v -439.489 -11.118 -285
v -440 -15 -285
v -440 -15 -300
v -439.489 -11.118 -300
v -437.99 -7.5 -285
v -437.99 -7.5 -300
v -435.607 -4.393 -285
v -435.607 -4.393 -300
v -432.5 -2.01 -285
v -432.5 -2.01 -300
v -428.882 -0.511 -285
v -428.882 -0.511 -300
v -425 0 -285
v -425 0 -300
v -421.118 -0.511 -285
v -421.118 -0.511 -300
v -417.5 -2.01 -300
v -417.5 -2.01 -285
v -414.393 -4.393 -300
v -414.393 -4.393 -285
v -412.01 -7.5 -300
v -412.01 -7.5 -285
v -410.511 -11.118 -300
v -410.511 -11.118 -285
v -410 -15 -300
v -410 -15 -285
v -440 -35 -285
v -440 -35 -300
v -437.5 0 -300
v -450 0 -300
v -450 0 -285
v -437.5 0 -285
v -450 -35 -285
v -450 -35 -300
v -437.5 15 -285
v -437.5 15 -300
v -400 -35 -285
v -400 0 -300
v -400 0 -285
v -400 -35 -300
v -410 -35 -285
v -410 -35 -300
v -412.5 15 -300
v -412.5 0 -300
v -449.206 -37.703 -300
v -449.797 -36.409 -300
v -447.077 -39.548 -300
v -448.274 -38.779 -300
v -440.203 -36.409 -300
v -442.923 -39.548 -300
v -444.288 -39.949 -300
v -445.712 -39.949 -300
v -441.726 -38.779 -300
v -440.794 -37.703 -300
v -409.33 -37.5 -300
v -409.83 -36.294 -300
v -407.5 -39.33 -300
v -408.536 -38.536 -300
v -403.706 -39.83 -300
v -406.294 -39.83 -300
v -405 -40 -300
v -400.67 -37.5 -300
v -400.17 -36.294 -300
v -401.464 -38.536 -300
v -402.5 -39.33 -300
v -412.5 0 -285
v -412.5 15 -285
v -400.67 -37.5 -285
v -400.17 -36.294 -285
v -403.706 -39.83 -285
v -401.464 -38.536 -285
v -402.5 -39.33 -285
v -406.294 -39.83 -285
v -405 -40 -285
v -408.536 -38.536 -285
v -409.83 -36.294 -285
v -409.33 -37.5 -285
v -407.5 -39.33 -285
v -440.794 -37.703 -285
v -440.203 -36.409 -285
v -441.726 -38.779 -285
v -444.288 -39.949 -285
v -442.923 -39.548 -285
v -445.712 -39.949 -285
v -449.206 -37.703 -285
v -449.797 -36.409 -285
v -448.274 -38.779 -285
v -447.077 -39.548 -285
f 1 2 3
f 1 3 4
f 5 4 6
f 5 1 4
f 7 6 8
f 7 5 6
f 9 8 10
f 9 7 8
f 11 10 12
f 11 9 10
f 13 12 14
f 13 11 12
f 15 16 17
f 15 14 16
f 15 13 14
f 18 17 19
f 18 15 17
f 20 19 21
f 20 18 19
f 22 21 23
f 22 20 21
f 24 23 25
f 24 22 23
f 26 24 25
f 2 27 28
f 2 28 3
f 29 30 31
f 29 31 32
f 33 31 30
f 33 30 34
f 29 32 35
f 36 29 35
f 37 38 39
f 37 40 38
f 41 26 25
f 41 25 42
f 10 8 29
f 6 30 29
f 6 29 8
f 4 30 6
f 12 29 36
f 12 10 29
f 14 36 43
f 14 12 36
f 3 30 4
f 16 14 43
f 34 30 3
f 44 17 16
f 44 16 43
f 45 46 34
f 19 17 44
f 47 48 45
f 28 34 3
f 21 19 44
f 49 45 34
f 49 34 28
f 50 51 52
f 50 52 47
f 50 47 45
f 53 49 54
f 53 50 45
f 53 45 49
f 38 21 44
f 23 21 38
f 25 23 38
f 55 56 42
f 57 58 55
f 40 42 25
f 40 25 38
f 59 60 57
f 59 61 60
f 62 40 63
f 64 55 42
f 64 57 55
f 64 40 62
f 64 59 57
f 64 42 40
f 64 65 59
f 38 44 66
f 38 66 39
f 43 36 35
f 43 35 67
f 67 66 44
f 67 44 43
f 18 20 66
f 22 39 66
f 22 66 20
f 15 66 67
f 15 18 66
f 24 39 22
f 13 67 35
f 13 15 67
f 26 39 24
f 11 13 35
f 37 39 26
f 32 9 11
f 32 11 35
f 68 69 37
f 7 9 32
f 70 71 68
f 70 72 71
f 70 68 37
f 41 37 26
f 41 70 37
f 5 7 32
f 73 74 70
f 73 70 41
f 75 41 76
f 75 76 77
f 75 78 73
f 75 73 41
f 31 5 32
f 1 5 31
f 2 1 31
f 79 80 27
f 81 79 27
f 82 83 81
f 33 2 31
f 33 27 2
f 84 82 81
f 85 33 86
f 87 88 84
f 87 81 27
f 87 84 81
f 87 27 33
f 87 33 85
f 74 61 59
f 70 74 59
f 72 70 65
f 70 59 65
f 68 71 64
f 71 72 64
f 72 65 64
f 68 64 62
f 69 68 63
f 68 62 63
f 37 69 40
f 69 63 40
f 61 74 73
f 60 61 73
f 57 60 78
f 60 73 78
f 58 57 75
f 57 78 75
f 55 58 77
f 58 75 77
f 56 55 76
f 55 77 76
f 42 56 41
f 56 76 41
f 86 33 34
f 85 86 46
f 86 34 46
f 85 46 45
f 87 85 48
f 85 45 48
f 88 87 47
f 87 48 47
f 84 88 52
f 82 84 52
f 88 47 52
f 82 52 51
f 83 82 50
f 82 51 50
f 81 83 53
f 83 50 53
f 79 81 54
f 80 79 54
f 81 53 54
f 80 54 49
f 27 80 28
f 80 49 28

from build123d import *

# Parameters (mm, degrees)
BOSS_EXTRUDE1_DEPTH             = 15
BOSS_EXTRUDE2_REACH             = 1239.023
BOSS_EXTRUDE2_DIRECTION_2_REACH = 1239.023
CUT_EXTRUDE2_DEPTH              = 1238.578280352
CUT_EXTRUDE2_DEPTH_BACK         = 1238.578280352
SKETCH5_W                       = 40
SKETCH5_H                       = 40
CUT_EXTRUDE3_DEPTH              = 1238.578280352
BOSS_EXTRUDE4_DEPTH             = 75
CUT_EXTRUDE4_DEPTH              = 1241.107934819
CUT_EXTRUDE4_DEPTH_BACK         = 1241.107934819
SKETCH8_W                       = 15
SKETCH8_H                       = 73.7
FILLET1_R                       = 5
CUT_EXTRUDE5_DEPTH              = 1241.107934819
CUT_EXTRUDE5_DEPTH_BACK         = 1241.107934819
SKETCH10_W                      = 12.5
SKETCH10_H                      = 15
CUT_EXTRUDE6_DEPTH              = 453.023229492


with BuildPart() as part:
    # Sketch1 → Boss-Extrude1 (new body)
    with BuildSketch(Plane(origin=(0, 0, 0), x_dir=(1, 0, 0), z_dir=(0, 1, 0))):
        Polygon((-450, 300), (-400, 300), (-200, 250), (600, 40), (1200, 40), (1200, -40), (600, -40), (-200, -250), (-400, -300), (-450, -300), align=None)
    extrude(amount=BOSS_EXTRUDE1_DEPTH)

    # Boss-Extrude2: up to this face of the body (flat: up to its plane)
    boss_extrude2_end = Plane(part.part.faces().sort_by_distance((-425, 7.5, 300))[0])
    # Sketch2 → Boss-Extrude2 (add, up to the picked face)
    with BuildSketch(Plane.XY, mode=Mode.PRIVATE) as boss_extrude2_sk1:
        with BuildLine():
            Line((-425, 0), (-450, 0))
            Line((-450, 0), (-450, -40))
            Line((-450, -40), (-440, -40))
            Line((-440, -40), (-440, -15))
            ThreePointArc((-440, -15), (-435.606601718, -4.393398282), (-425, 0))
        make_face()
    boss_extrude2_tool1 = split(extrude(boss_extrude2_sk1.sketch, amount=BOSS_EXTRUDE2_REACH, mode=Mode.PRIVATE), bisect_by=boss_extrude2_end, keep=Keep.BOTH, mode=Mode.PRIVATE)
    # Sketch2 → Boss-Extrude2 (add, up to the picked face)
    with BuildSketch(Plane.XY, mode=Mode.PRIVATE) as boss_extrude2_sk2:
        with BuildLine():
            Line((-400, 0), (-425, 0))
            ThreePointArc((-425, 0), (-414.393398282, -4.393398282), (-410, -15))
            Line((-410, -15), (-410, -40))
            Line((-410, -40), (-400, -40))
            Line((-400, -40), (-400, 0))
        make_face()
    boss_extrude2_tool2 = split(extrude(boss_extrude2_sk2.sketch, amount=BOSS_EXTRUDE2_REACH, mode=Mode.PRIVATE), bisect_by=boss_extrude2_end, keep=Keep.BOTH, mode=Mode.PRIVATE)
    add(boss_extrude2_tool1.solids().sort_by(Axis((-444.100555, -18.206662, 0), (0, 0, 1)))[0])
    add(boss_extrude2_tool2.solids().sort_by(Axis((-405.899445, -18.206662, 0), (0, 0, 1)))[0])

    # Boss-Extrude2 direction 2: up to this face of the body (flat: up to its plane)
    boss_extrude2_direction_2_end = Plane(part.part.faces().sort_by_distance((-425, 7.5, -300))[0])
    # Sketch2 → Boss-Extrude2 direction 2 (add, up to the picked face)
    with BuildSketch(Plane.XY, mode=Mode.PRIVATE) as boss_extrude2_direction_2_sk1:
        with BuildLine():
            Line((-425, 0), (-450, 0))
            Line((-450, 0), (-450, -40))
            Line((-450, -40), (-440, -40))
            Line((-440, -40), (-440, -15))
            ThreePointArc((-440, -15), (-435.606601718, -4.393398282), (-425, 0))
        make_face()
    boss_extrude2_direction_2_tool1 = split(extrude(boss_extrude2_direction_2_sk1.sketch, amount=-BOSS_EXTRUDE2_DIRECTION_2_REACH, mode=Mode.PRIVATE), bisect_by=boss_extrude2_direction_2_end, keep=Keep.BOTH, mode=Mode.PRIVATE)
    # Sketch2 → Boss-Extrude2 direction 2 (add, up to the picked face)
    with BuildSketch(Plane.XY, mode=Mode.PRIVATE) as boss_extrude2_direction_2_sk2:
        with BuildLine():
            Line((-400, 0), (-425, 0))
            ThreePointArc((-425, 0), (-414.393398282, -4.393398282), (-410, -15))
            Line((-410, -15), (-410, -40))
            Line((-410, -40), (-400, -40))
            Line((-400, -40), (-400, 0))
        make_face()
    boss_extrude2_direction_2_tool2 = split(extrude(boss_extrude2_direction_2_sk2.sketch, amount=-BOSS_EXTRUDE2_DIRECTION_2_REACH, mode=Mode.PRIVATE), bisect_by=boss_extrude2_direction_2_end, keep=Keep.BOTH, mode=Mode.PRIVATE)
    add(boss_extrude2_direction_2_tool1.solids().sort_by(Axis((-444.100555, -18.206662, 0), (0, 0, -1)))[0])
    add(boss_extrude2_direction_2_tool2.solids().sort_by(Axis((-405.899445, -18.206662, 0), (0, 0, -1)))[0])

    # Sketch4 → Cut-Extrude2 (cut, two sides: drawn at the far end of the back side and taken through both)
    with BuildSketch(Plane(origin=(0, 0, 0), x_dir=(1, 0, 0), z_dir=(0, 1, 0)).offset(-CUT_EXTRUDE2_DEPTH_BACK)):
        Polygon((-450, 230), (-400, 230), (-150, 167.5), (-150, -167.5), (-400, -230), (-450, -230), align=None)
        Polygon((-100, 155), (-100, -155), (520, 0), align=None)
    extrude(amount=CUT_EXTRUDE2_DEPTH + CUT_EXTRUDE2_DEPTH_BACK, mode=Mode.SUBTRACT)

    # Sketch5 → Cut-Extrude3 (cut, through all)
    with BuildSketch(Plane(origin=(0, 0, 0), x_dir=(0, 0, -1), z_dir=(1, 0, 0))):
        with Locations((-265, -20)):
            Rectangle(SKETCH5_W, SKETCH5_H)
        with Locations((265, -20)):
            Rectangle(SKETCH5_W, SKETCH5_H)
    extrude(amount=-CUT_EXTRUDE3_DEPTH, mode=Mode.SUBTRACT)

    # Sketch7 → Boss-Extrude4 (add)
    with BuildSketch(Plane(origin=(1200, 0, 0), x_dir=(0, 0, -1), z_dir=(1, 0, 0))):
        with BuildLine():
            Line((-87.5, 50), (-40, 15))
            Line((-40, 15), (40, 15))
            Line((40, 15), (87.5, 50))
            Line((87.5, 50), (87.5, 88.7))
            Line((87.5, 88.7), (58.5, 88.7))
            Line((58.5, 88.7), (58.5, 63.2))
            Line((58.5, 63.2), (48.5, 63.2))
            Line((48.5, 63.2), (48.5, 88.7))
            Line((48.5, 88.7), (20, 88.7))
            Line((20, 88.7), (20, 50))
            ThreePointArc((20, 50), (0, 30), (-20, 50))
            Line((-20, 50), (-20, 88.7))
            Line((-20, 88.7), (-63, 88.7))
            Line((-63, 88.7), (-63, 63.2))
            Line((-63, 63.2), (-73, 63.2))
            Line((-73, 63.2), (-73, 88.7))
            Line((-73, 88.7), (-87.5, 88.7))
            Line((-87.5, 88.7), (-87.5, 50))
        make_face()
    extrude(amount=-BOSS_EXTRUDE4_DEPTH)

    # Sketch8 → Cut-Extrude4 (cut, two sides: drawn at the far end of the back side and taken through both)
    with BuildSketch(Plane.XY.offset(-CUT_EXTRUDE4_DEPTH_BACK)):
        with Locations((1147.5, 51.85)):
            Rectangle(SKETCH8_W, SKETCH8_H)
        with Locations((1177.5, 51.85)):
            Rectangle(SKETCH8_W, SKETCH8_H)
    extrude(amount=CUT_EXTRUDE4_DEPTH + CUT_EXTRUDE4_DEPTH_BACK, mode=Mode.SUBTRACT)

    # Fillet1
    # the kernel refuses this fillet: 5 mm, written as the material it adds along each edge
    with BuildSketch(Plane(origin=(600, 0, -40), x_dir=(1, 0, 0), z_dir=(0, 1, 0)), Plane(origin=(600, 0, 40), x_dir=(-0.9672309653794254, 0, 0.25389812841213444), z_dir=(0, 1, 0))) as fillet1_piece_1:
        with BuildLine():
            CenterArc((FILLET1_R * 0.12906371081, FILLET1_R), FILLET1_R, 255.2916961, 14.7083039)
            Line((-FILLET1_R * 0.124834417602, FILLET1_R * 0.0327690346206), (0, 0))
            Line((0, 0), (FILLET1_R * 0.12906371081, 0))
        make_face()
    extrude(amount=15)
    with BuildSketch(Plane(origin=(-150, 15, -167.5), x_dir=(-0.9701425001453314, 0, -0.2425356250363347), z_dir=(0, -1, 0)), Plane(origin=(-150, 15, 167.5), x_dir=(0, 0, -1), z_dir=(0, -1, 0))) as fillet1_piece_2:
        with BuildLine():
            CenterArc((FILLET1_R * 0.780776406404, -FILLET1_R), FILLET1_R, 90, 75.963756532)
            Line((-FILLET1_R * 0.189366093741, -FILLET1_R * 0.757464374964), (0, 0))
            Line((0, 0), (FILLET1_R * 0.780776406404, 0))
        make_face()
    extrude(amount=15)
    with BuildSketch(Plane(origin=(-100, 15, -155), x_dir=(0.9701425001453314, 0, 0.24253562503633508), z_dir=(0, -1, 0)), Plane(origin=(-100, 0, 155), x_dir=(0.9701425001453319, 0, -0.24253562503633352), z_dir=(0, 1, 0))) as fillet1_piece_3:
        with BuildLine():
            CenterArc((FILLET1_R * 1.2807764064, FILLET1_R), FILLET1_R, 165.963756532, 104.036243468)
            Line((FILLET1_R * 0.310633906259, FILLET1_R * 1.24253562504), (0, 0))
            Line((0, 0), (FILLET1_R * 1.2807764064, 0))
        make_face()
    extrude(amount=15)
    with BuildSketch(Plane(origin=(520, 15, 0), x_dir=(-0.9701425001453318, 0, -0.24253562503633325), z_dir=(0, -1, 0))) as fillet1_piece_4:
        with BuildLine():
            CenterArc((FILLET1_R * 4, -FILLET1_R), FILLET1_R, 90, 151.927513064)
            Line((FILLET1_R * 3.52941176471, -FILLET1_R * 1.88235294118), (0, 0))
            Line((0, 0), (FILLET1_R * 4, 0))
        make_face()
    extrude(amount=15)
    # the kernel refuses this fillet: 5 mm, written as the material it takes off along each edge
    with BuildSketch(Plane(origin=(-440, -40, 217.5), x_dir=(0, 1, 0), z_dir=(0, 0, 1)), Plane(origin=(-400, -40, 217.5), x_dir=(0, 1, 0), z_dir=(0, 0, 1)), Plane(origin=(-440, -40, -312.5), x_dir=(0, 1, 0), z_dir=(0, 0, 1)), Plane(origin=(-450, -40, -312.5), x_dir=(1, 0, 0), z_dir=(0, 0, 1)), Plane(origin=(-400, -40, -312.5), x_dir=(0, 1, 0), z_dir=(0, 0, 1)), Plane(origin=(1152.5, 88.7, -20), x_dir=(0, 0, -1), z_dir=(-1, 0, 0)), Plane(origin=(1152.5, 88.7, -48.5), x_dir=(0, -1, 0), z_dir=(-1, 0, 0)), Plane(origin=(1152.5, 88.7, -58.5), x_dir=(0, 0, -1), z_dir=(-1, 0, 0)), Plane(origin=(1152.5, 88.7, -87.5), x_dir=(0, -1, 0), z_dir=(-1, 0, 0)), Plane(origin=(1152.5, 88.7, 87.5), x_dir=(0, 0, -1), z_dir=(-1, 0, 0)), Plane(origin=(1152.5, 88.7, 73), x_dir=(0, -1, 0), z_dir=(-1, 0, 0)), Plane(origin=(1152.5, 88.7, 63), x_dir=(0, 0, -1), z_dir=(-1, 0, 0)), Plane(origin=(1152.5, 88.7, 20), x_dir=(0, -1, 0), z_dir=(-1, 0, 0)), Plane(origin=(1182.5, 88.7, 20), x_dir=(0, -1, 0), z_dir=(-1, 0, 0)), Plane(origin=(1212.5, 88.7, 20), x_dir=(0, -1, 0), z_dir=(-1, 0, 0)), Plane(origin=(1182.5, 88.7, 63), x_dir=(0, 0, -1), z_dir=(-1, 0, 0)), Plane(origin=(1212.5, 88.7, 63), x_dir=(0, 0, -1), z_dir=(-1, 0, 0)), Plane(origin=(1182.5, 88.7, 73), x_dir=(0, -1, 0), z_dir=(-1, 0, 0)), Plane(origin=(1212.5, 88.7, 73), x_dir=(0, -1, 0), z_dir=(-1, 0, 0)), Plane(origin=(1182.5, 88.7, -87.5), x_dir=(0, -1, 0), z_dir=(-1, 0, 0)), Plane(origin=(1212.5, 88.7, -87.5), x_dir=(0, -1, 0), z_dir=(-1, 0, 0)), Plane(origin=(1182.5, 88.7, -58.5), x_dir=(0, 0, -1), z_dir=(-1, 0, 0)), Plane(origin=(1212.5, 88.7, -58.5), x_dir=(0, 0, -1), z_dir=(-1, 0, 0)), Plane(origin=(1182.5, 88.7, -48.5), x_dir=(0, -1, 0), z_dir=(-1, 0, 0)), Plane(origin=(1212.5, 88.7, -48.5), x_dir=(0, -1, 0), z_dir=(-1, 0, 0)), Plane(origin=(1182.5, 88.7, -20), x_dir=(0, 0, -1), z_dir=(-1, 0, 0)), Plane(origin=(1212.5, 88.7, -20), x_dir=(0, 0, -1), z_dir=(-1, 0, 0)), Plane(origin=(-410, -40, 312.5), x_dir=(0, 1, 0), z_dir=(0, 0, -1)), Plane(origin=(-410, -40, -217.5), x_dir=(0, 1, 0), z_dir=(0, 0, -1))) as fillet1_2_piece_1:
        with BuildLine():
            CenterArc((FILLET1_R, FILLET1_R), FILLET1_R, 180, 90)
            Line((0, FILLET1_R), (0, 0))
            Line((0, 0), (FILLET1_R, 0))
        make_face()
    extrude(amount=40, mode=Mode.SUBTRACT)
    with BuildSketch(Plane(origin=(-450, -40, 217.5), x_dir=(0, 1, 0), z_dir=(0, 0, 1)), Plane(origin=(-410, -40, 257.5), x_dir=(1, 0, 0), z_dir=(0, 0, -1)), Plane(origin=(-410, -40, -272.5), x_dir=(1, 0, 0), z_dir=(0, 0, -1)), Plane(origin=(1182.5, 88.7, 87.5), x_dir=(0, -1, 0), z_dir=(-1, 0, 0)), Plane(origin=(1212.5, 88.7, 87.5), x_dir=(0, -1, 0), z_dir=(-1, 0, 0)), Plane(origin=(-400, -40, 272.5), x_dir=(-1, 0, 0), z_dir=(0, 0, 1)), Plane(origin=(-450, -40, 272.5), x_dir=(0, 1, 0), z_dir=(0, 0, 1)), Plane(origin=(-440, -40, 272.5), x_dir=(-1, 0, 0), z_dir=(0, 0, 1)), Plane(origin=(-440, -40, -257.5), x_dir=(-1, 0, 0), z_dir=(0, 0, 1)), Plane(origin=(-450, -40, -257.5), x_dir=(0, 1, 0), z_dir=(0, 0, 1)), Plane(origin=(-400, -40, -257.5), x_dir=(-1, 0, 0), z_dir=(0, 0, 1))) as fillet1_2_piece_2:
        with BuildLine():
            CenterArc((FILLET1_R, -FILLET1_R), FILLET1_R, 90, 90)
            Line((0, -FILLET1_R), (0, 0))
            Line((0, 0), (FILLET1_R, 0))
        make_face()
    extrude(amount=40, mode=Mode.SUBTRACT)
    with BuildSketch(Plane(origin=(1146.316347002, 50, -87.5), x_dir=(0, -0.5931990380498489, 0.8050558373533688), z_dir=(-1, 0, 0)), Plane(origin=(1176.316347002, 50, -87.5), x_dir=(0, -0.5931990380498489, 0.8050558373533688), z_dir=(-1, 0, 0)), Plane(origin=(1206.316347002, 50, -87.5), x_dir=(0, -0.5931990380498489, 0.8050558373533688), z_dir=(-1, 0, 0))) as fillet1_2_piece_3:
        with BuildLine():
            CenterArc((FILLET1_R * 0.505307760127, FILLET1_R), FILLET1_R, 216.384351816, 53.615648184)
            Line((-FILLET1_R * 0.299748077226, FILLET1_R * 0.40680096195), (0, 0))
            Line((0, 0), (FILLET1_R * 0.505307760127, 0))
        make_face()
    extrude(amount=27.632694003, mode=Mode.SUBTRACT)
    with BuildSketch(Plane(origin=(1146.316347002, 50, 87.5), x_dir=(0, -0.5931990380498499, -0.8050558373533683), z_dir=(-1, 0, 0)), Plane(origin=(1176.316347002, 50, 87.5), x_dir=(0, -0.5931990380498499, -0.8050558373533683), z_dir=(-1, 0, 0)), Plane(origin=(1206.316347002, 50, 87.5), x_dir=(0, -0.5931990380498499, -0.8050558373533683), z_dir=(-1, 0, 0))) as fillet1_2_piece_4:
        with BuildLine():
            CenterArc((FILLET1_R * 0.505307760127, -FILLET1_R), FILLET1_R, 90, 53.615648184)
            Line((-FILLET1_R * 0.299748077226, -FILLET1_R * 0.40680096195), (0, 0))
            Line((0, 0), (FILLET1_R * 0.505307760127, 0))
        make_face()
    extrude(amount=27.632694003, mode=Mode.SUBTRACT)

    # Sketch9 → Cut-Extrude5 (cut, two sides: drawn at the far end of the back side and taken through both)
    with BuildSketch(Plane(origin=(0, 0, 0), x_dir=(1, 0, 0), z_dir=(0, 1, 0)).offset(-CUT_EXTRUDE5_DEPTH_BACK)):
        Polygon((-450, 285), (-450, -300), (1200, -300), (1200, 300), (-400, 300), (-400, 285), align=None)
    extrude(amount=CUT_EXTRUDE5_DEPTH + CUT_EXTRUDE5_DEPTH_BACK, mode=Mode.SUBTRACT)

    # Sketch10 → Cut-Extrude6 (cut, through all)
    with BuildSketch(Plane.XY.offset(-285)):
        with Locations((-443.75, 7.5)):
            Rectangle(SKETCH10_W, SKETCH10_H)
        with Locations((-406.25, 7.5)):
            Rectangle(SKETCH10_W, SKETCH10_H)
    extrude(amount=-CUT_EXTRUDE6_DEPTH, mode=Mode.SUBTRACT)


solid = part.part
